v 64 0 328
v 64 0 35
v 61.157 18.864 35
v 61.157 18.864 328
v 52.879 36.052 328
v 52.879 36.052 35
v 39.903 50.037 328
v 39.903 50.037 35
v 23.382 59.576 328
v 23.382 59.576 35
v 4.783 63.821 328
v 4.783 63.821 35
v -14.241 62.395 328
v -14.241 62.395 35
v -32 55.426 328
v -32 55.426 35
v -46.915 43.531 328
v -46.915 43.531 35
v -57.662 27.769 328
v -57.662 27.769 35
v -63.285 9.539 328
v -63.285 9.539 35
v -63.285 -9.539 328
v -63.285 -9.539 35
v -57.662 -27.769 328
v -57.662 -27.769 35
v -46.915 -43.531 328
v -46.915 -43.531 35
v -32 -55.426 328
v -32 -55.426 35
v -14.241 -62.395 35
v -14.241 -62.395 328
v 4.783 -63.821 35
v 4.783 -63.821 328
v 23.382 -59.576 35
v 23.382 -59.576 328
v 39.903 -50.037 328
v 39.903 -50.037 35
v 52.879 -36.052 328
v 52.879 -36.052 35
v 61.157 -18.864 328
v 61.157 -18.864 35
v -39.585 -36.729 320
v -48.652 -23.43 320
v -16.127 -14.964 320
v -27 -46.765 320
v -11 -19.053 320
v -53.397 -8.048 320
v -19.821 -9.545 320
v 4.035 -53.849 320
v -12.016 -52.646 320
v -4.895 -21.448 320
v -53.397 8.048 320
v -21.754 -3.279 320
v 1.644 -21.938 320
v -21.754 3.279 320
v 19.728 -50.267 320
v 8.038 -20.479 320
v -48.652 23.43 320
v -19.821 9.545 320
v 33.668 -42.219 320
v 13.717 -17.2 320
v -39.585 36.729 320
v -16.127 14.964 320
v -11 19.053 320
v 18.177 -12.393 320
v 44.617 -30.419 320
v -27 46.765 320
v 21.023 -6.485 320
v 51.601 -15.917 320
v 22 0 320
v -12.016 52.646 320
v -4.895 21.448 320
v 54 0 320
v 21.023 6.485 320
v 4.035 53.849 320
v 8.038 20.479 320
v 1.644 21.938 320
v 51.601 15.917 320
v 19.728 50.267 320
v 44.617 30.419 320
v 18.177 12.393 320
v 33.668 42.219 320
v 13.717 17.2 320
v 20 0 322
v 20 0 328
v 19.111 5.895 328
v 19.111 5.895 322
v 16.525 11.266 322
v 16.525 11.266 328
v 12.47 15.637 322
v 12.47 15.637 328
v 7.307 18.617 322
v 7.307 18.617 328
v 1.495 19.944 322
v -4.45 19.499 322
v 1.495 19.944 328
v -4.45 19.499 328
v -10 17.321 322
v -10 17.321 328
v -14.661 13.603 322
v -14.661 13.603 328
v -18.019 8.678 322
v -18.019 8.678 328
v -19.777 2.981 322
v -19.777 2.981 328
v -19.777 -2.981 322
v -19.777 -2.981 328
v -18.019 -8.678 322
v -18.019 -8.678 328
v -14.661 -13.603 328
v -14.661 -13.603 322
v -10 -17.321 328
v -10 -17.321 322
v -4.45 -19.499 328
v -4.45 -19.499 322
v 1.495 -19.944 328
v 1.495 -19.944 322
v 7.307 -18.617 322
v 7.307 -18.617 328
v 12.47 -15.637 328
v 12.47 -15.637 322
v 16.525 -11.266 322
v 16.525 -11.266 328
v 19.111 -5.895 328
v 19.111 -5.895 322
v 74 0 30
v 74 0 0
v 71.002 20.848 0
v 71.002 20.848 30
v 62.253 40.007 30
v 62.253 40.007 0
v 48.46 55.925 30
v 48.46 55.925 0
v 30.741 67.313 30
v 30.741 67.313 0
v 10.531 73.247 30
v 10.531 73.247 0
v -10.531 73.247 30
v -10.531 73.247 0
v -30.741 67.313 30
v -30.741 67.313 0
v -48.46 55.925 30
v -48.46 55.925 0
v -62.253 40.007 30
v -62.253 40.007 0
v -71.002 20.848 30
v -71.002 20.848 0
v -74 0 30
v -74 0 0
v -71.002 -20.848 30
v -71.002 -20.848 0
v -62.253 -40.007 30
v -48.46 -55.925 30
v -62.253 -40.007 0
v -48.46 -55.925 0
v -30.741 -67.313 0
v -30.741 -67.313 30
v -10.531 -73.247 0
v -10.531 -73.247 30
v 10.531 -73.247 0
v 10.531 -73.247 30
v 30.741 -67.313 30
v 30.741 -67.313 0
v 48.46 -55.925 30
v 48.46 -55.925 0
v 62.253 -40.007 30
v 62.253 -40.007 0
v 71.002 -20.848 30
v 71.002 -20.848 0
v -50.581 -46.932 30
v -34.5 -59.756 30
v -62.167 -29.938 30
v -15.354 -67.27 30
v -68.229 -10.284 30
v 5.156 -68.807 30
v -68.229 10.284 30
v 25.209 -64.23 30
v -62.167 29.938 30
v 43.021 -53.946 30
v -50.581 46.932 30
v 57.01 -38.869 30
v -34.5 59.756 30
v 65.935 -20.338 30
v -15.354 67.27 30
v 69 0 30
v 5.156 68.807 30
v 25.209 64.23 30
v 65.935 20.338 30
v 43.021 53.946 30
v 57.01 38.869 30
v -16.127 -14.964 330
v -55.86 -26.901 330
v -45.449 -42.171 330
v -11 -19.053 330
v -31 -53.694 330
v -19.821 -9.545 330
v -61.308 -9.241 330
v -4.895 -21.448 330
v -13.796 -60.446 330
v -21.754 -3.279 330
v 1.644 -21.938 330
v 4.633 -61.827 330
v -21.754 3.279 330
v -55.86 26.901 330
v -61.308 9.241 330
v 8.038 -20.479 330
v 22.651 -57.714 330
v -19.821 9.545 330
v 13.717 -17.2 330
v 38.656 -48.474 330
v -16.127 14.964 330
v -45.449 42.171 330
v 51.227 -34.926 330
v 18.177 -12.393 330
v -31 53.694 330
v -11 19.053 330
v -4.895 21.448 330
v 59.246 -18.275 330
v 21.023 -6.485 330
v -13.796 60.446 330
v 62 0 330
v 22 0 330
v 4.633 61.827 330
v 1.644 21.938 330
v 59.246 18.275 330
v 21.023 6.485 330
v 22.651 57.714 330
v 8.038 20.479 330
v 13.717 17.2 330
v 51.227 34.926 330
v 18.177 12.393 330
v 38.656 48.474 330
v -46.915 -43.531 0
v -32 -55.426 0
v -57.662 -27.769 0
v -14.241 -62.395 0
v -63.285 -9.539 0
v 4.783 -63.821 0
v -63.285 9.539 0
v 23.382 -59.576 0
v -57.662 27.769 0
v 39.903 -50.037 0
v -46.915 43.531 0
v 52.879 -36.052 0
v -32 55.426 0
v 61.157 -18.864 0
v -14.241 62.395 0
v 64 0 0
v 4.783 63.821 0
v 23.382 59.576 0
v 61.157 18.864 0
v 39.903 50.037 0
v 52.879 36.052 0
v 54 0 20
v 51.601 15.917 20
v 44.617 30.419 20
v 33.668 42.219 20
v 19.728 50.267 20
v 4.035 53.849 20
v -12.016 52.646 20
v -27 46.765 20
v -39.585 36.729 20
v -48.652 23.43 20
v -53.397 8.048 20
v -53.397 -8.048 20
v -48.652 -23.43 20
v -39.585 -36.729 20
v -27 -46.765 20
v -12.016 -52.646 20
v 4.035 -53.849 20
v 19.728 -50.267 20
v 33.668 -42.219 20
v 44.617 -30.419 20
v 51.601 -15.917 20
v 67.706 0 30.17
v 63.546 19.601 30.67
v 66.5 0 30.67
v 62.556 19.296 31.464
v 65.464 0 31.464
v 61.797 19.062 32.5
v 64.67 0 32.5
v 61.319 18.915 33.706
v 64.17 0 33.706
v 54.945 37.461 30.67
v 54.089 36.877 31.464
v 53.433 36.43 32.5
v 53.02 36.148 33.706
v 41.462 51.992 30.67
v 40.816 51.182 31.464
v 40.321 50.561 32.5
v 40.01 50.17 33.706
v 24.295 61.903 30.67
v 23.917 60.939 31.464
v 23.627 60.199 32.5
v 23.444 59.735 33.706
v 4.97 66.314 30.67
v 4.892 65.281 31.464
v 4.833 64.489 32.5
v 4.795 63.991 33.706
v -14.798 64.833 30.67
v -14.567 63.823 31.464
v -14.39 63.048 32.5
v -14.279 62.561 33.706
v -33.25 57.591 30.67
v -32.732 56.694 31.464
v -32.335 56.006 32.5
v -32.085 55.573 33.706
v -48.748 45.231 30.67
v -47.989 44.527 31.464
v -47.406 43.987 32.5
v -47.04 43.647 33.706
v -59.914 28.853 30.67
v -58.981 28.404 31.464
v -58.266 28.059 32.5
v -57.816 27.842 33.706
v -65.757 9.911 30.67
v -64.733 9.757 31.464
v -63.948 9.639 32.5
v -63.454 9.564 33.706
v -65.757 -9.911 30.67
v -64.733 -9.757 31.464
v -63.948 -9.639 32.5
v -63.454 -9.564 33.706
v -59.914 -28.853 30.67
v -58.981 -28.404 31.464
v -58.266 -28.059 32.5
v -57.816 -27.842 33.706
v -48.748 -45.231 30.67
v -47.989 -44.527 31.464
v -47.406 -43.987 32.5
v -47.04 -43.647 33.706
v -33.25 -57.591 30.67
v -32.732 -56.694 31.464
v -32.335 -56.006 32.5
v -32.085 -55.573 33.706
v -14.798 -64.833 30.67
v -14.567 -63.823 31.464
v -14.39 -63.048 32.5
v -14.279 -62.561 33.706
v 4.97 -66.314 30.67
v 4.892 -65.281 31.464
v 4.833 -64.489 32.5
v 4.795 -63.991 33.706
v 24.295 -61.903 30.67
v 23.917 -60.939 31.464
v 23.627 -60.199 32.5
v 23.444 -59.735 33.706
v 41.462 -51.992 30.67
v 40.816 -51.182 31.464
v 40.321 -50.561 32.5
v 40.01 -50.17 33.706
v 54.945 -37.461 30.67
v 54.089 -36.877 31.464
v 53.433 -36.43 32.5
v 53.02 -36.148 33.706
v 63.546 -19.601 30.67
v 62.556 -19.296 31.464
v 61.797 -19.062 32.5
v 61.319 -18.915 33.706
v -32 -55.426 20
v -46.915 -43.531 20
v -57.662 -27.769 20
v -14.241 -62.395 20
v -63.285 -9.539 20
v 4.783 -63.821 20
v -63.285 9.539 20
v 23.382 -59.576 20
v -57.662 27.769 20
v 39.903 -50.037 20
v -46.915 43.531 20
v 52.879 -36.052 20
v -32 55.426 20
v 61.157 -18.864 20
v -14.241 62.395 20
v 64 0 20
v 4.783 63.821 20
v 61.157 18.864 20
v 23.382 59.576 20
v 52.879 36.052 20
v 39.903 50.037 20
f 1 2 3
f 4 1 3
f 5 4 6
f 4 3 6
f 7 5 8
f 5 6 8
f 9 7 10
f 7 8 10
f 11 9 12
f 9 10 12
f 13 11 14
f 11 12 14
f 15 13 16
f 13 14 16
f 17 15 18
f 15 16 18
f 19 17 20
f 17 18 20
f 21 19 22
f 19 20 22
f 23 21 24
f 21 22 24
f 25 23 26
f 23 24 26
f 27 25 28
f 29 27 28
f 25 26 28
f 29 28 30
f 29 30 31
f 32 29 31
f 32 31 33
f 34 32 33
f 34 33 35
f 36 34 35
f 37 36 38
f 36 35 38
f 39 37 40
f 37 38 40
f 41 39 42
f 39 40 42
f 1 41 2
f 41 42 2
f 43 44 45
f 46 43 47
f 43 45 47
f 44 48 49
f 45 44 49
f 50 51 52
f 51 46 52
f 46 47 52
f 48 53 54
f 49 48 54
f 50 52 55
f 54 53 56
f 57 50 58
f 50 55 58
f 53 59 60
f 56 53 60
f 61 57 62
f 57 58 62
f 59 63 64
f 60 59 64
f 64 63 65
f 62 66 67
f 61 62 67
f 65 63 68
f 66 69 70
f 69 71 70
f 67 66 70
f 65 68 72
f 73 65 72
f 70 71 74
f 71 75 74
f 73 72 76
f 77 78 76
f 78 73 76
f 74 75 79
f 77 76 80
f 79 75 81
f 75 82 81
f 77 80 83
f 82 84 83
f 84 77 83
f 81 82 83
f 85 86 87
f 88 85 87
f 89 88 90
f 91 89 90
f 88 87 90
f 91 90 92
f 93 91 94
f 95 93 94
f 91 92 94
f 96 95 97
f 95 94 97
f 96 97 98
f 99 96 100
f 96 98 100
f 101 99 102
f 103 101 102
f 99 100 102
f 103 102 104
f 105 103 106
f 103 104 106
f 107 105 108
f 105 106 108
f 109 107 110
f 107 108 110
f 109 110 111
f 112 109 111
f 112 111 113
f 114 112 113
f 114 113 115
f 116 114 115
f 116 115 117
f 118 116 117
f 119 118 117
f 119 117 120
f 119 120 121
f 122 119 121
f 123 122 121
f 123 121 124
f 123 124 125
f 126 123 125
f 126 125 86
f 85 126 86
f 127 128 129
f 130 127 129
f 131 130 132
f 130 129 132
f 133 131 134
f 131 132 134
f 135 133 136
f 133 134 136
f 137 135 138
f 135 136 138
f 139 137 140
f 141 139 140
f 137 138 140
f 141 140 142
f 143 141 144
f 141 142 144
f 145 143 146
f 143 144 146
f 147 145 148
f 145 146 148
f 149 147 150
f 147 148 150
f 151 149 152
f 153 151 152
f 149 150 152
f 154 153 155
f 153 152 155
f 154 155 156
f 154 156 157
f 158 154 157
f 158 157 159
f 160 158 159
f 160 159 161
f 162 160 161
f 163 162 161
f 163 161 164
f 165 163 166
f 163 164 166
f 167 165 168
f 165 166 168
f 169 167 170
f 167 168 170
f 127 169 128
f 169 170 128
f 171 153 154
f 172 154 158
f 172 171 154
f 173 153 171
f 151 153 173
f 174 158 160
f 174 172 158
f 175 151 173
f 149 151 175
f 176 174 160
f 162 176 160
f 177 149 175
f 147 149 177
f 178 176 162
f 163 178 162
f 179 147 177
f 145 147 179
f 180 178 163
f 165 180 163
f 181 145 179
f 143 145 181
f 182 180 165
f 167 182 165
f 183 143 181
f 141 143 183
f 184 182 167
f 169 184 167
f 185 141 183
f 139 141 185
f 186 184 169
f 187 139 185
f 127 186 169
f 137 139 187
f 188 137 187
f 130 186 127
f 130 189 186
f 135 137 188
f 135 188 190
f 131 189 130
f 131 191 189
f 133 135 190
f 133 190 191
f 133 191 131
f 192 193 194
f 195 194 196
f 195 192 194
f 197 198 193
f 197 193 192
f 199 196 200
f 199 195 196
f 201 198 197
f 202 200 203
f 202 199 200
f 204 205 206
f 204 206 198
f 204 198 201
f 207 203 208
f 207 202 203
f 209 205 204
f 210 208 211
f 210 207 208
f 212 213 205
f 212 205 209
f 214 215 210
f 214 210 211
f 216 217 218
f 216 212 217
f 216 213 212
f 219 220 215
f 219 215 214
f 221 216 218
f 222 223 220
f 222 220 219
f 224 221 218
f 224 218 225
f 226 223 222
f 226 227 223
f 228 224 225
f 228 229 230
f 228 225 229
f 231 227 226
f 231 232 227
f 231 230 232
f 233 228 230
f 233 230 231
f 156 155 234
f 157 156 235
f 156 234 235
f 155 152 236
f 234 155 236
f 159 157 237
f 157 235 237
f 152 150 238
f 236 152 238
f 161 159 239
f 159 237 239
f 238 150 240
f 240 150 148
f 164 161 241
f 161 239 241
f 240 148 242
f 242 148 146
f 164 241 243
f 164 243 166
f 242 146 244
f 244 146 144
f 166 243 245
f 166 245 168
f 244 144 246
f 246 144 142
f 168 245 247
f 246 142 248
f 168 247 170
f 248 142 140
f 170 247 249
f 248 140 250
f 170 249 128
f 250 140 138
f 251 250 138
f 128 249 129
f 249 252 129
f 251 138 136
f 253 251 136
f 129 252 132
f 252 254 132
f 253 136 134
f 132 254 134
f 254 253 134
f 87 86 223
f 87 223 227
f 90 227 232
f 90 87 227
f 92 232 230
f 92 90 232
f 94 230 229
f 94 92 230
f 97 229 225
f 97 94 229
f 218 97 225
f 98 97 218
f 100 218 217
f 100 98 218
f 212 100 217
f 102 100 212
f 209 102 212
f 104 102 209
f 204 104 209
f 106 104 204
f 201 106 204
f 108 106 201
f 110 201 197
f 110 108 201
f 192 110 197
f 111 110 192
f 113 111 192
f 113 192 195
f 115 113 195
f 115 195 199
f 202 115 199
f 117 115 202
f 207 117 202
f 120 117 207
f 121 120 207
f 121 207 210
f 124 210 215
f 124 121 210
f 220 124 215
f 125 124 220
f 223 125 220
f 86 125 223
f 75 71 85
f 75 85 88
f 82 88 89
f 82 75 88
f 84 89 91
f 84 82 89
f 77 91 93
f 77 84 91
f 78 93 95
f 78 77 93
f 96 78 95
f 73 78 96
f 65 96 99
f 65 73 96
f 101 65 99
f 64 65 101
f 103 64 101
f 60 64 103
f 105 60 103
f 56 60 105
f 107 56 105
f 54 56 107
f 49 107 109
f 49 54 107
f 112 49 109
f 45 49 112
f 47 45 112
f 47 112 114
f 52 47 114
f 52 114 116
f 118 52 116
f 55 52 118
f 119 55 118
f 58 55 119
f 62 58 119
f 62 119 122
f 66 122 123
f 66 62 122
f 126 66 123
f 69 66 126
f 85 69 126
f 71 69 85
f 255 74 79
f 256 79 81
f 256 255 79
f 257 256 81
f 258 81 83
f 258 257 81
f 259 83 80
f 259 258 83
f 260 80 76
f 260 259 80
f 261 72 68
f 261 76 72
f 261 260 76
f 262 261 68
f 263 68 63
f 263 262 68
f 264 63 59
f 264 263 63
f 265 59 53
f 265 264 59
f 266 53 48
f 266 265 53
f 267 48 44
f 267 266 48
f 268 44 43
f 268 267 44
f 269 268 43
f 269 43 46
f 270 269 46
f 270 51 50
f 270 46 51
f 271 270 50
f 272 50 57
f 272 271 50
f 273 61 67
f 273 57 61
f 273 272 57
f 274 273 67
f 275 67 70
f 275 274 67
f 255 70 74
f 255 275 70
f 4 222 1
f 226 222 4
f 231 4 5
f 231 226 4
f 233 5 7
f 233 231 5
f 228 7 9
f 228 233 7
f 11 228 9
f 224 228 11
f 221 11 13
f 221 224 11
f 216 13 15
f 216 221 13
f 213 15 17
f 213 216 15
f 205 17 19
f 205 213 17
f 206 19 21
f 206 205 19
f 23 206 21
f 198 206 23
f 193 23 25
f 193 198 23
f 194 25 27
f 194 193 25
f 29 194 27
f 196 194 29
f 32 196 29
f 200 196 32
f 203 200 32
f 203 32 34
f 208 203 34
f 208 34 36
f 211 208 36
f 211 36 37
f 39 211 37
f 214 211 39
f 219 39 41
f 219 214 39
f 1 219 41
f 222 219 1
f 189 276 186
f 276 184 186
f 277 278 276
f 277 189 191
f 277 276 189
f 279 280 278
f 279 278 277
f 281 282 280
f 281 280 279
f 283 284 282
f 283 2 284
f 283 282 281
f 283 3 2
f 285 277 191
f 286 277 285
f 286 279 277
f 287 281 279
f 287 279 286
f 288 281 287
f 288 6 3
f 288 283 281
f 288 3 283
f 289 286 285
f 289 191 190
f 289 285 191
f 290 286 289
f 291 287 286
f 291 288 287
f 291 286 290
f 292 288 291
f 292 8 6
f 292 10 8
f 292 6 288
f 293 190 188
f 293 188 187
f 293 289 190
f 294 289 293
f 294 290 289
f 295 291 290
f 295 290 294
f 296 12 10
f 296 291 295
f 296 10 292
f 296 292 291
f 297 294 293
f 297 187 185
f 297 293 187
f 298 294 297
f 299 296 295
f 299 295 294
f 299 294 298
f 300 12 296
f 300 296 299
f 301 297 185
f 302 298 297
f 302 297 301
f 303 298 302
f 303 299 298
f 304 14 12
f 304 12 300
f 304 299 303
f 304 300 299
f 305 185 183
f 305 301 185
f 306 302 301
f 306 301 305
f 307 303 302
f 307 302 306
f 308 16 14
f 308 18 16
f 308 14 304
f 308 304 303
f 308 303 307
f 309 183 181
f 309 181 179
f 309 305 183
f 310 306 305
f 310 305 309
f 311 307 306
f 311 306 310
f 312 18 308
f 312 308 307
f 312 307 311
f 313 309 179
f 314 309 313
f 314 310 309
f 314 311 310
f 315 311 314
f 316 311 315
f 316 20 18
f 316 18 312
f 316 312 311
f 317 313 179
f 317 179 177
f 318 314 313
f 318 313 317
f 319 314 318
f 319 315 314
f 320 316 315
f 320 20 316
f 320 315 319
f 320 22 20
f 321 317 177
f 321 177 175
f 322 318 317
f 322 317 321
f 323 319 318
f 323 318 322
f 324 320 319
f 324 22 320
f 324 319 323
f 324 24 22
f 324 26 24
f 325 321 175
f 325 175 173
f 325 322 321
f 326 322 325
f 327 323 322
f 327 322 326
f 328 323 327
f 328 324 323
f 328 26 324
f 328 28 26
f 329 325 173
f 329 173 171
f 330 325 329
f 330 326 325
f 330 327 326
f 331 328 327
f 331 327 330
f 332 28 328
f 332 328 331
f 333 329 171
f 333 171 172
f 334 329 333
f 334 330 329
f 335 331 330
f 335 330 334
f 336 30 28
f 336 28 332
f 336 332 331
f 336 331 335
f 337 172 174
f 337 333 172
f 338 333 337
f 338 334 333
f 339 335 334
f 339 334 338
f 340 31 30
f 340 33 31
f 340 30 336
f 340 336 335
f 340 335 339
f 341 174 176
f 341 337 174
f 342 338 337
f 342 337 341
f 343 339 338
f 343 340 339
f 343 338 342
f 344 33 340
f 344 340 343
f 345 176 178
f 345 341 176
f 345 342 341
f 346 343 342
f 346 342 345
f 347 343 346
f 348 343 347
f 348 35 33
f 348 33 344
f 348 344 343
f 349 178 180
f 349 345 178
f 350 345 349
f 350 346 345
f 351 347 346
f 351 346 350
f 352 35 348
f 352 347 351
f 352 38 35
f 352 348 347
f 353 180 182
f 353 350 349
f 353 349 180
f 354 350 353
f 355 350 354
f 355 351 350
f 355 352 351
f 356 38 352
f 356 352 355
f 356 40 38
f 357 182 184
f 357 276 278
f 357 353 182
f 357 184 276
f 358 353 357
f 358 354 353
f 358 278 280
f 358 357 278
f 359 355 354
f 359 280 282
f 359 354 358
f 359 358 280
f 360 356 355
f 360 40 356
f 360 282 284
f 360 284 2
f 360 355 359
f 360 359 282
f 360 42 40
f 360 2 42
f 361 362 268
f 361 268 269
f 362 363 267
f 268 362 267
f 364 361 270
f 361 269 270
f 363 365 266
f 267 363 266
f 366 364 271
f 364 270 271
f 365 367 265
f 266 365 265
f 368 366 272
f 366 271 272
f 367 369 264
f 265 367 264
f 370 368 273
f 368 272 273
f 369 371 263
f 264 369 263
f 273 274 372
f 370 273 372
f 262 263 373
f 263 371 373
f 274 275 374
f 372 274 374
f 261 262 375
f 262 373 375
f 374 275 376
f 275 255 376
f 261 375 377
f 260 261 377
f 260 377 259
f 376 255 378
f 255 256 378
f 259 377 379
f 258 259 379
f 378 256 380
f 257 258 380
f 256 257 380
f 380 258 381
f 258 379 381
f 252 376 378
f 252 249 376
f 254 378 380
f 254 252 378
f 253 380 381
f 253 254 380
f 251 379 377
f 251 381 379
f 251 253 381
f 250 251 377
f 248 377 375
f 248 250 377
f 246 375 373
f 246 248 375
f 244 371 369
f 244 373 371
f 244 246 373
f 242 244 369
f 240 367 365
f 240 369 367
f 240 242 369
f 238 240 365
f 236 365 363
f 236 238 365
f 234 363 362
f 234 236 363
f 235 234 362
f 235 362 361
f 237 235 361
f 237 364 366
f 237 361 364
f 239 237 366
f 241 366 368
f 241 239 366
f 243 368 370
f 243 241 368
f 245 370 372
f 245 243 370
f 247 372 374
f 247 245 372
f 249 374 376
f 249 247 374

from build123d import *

# Parameters (mm, degrees)
SKETCH1_R      = 74
EXTRUDE1_DEPTH = 30
SKETCH2_R      = 64
EXTRUDE2_DEPTH = 300
SHELL1_T       = -10
FILLET2_R      = 5
CHAMFER2_SIZE  = 2
SKETCH3_R      = 20
EXTRUDE3_DEPTH = 347.196476007
CHAMFER3_SIZE  = 2


with BuildPart() as part:
    # Sketch1 → Extrude1 (new body)
    with BuildSketch(Plane.XY):
        Circle(SKETCH1_R)
    extrude(amount=EXTRUDE1_DEPTH)

    # Sketch2 → Extrude2 (add)
    with BuildSketch(Plane.XY.offset(30)):
        Circle(SKETCH2_R)
    extrude(amount=EXTRUDE2_DEPTH)

    # Shell1
    shell1_openings = [part.faces().sort_by_distance(p)[0] for p in [
        (0, 0, 0),
    ]]
    offset(amount=SHELL1_T, openings=shell1_openings, kind=Kind.INTERSECTION)

    # Fillet2
    fillet2_edges = [part.edges().sort_by_distance(p)[0] for p in [
        (-64, 0, 30),
    ]]
    fillet(fillet2_edges, radius=FILLET2_R)

    # Chamfer2
    chamfer2_edges = [part.edges().sort_by_distance(p)[0] for p in [
        (-64, 0, 330),
    ]]
    chamfer(chamfer2_edges, length=CHAMFER2_SIZE)

    # Sketch3 → Extrude3 (cut, through all)
    with BuildSketch(Plane.XY.offset(330)):
        Circle(SKETCH3_R)
    extrude(amount=-EXTRUDE3_DEPTH, mode=Mode.SUBTRACT)

    # Chamfer3
    chamfer3_edges = [part.edges().sort_by_distance(p)[0] for p in [
        (-20, 0, 320),
        (-20, 0, 330),
    ]]
    chamfer(chamfer3_edges, length=CHAMFER3_SIZE)


solid = part.part
